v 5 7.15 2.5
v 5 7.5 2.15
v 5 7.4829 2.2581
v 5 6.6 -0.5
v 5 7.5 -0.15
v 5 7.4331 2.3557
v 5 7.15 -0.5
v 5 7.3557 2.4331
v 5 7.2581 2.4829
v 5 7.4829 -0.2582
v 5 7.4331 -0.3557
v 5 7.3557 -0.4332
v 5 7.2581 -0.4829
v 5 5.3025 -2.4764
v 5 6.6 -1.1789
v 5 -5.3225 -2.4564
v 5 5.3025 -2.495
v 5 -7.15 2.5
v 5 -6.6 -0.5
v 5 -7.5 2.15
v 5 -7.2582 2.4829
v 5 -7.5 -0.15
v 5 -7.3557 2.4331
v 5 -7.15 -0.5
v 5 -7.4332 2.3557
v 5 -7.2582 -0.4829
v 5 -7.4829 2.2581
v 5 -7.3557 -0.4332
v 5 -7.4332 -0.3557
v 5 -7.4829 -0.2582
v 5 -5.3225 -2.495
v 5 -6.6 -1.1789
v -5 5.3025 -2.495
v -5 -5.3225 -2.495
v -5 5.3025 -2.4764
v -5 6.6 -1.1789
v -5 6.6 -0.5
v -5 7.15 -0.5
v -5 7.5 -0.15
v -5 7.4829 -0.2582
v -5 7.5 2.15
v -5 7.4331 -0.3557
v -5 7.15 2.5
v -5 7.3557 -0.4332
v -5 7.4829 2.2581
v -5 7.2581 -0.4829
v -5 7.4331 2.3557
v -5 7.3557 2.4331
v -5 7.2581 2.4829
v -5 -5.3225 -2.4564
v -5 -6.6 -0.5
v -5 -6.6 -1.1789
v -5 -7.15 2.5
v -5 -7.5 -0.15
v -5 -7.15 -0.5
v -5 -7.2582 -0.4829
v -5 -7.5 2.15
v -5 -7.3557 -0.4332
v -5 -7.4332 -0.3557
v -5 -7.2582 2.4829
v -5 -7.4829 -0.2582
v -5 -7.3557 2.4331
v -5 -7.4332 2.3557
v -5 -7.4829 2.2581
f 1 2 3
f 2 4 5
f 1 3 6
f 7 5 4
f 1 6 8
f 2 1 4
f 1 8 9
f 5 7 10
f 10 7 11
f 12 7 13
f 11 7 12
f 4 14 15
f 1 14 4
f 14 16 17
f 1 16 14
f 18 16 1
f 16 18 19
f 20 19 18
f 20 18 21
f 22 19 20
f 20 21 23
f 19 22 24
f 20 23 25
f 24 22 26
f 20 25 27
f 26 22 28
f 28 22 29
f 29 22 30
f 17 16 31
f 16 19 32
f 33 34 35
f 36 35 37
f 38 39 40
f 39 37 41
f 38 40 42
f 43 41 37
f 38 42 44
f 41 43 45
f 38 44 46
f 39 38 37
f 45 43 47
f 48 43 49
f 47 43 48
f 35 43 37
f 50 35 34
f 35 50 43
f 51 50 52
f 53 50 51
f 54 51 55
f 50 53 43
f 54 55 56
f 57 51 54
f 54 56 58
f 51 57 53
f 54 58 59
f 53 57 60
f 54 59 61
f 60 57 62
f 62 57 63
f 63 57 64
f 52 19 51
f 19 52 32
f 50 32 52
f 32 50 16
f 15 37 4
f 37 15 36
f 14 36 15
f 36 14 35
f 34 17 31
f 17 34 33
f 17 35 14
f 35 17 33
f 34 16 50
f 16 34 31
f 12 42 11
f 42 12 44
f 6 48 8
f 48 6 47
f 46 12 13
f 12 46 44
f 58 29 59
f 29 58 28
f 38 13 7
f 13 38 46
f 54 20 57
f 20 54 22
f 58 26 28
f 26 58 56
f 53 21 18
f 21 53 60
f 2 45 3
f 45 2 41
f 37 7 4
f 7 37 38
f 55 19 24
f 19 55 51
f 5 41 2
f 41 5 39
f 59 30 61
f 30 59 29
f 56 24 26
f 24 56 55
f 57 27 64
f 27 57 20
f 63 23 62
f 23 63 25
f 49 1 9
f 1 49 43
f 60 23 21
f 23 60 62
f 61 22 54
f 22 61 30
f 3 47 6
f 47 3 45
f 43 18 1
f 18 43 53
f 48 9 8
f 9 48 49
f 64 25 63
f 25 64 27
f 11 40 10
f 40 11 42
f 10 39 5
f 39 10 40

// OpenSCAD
// Specs from: http://media.digikey.com/pdf/Data%20Sheets/Hirose%20PDFs/MD_Series.pdf
$fn=20;

hdmi_plug_depth=10;
hdmi_plug_width=15;
hdmi_plug_height=5;

function hdmi_depth() = hdmi_plug_depth;
function hdmi_width() = hdmi_plug_width;
function hdmi_height() = hdmi_plug_height;

hdmi_plug_top_height=3;
hdmi_plug_bottom_height=hdmi_plug_height-hdmi_plug_top_height;
hdmi_plug_bevel_width=1.3;

rounding_radius=0.35;
top_unrounded_height=hdmi_plug_top_height-(2*rounding_radius);
top_unrounded_width=hdmi_plug_width-(2*rounding_radius);
bottom_square_width=10.6;
bottom_bevel_hypotenuse=1.84;

diff_buffer=0.2;

module hdmi_upper(){
    translate([-(hdmi_plug_depth/2),-(top_unrounded_width/2),rounding_radius])
        rotate([90,0,90]) 
            linear_extrude(height=hdmi_plug_depth){
                offset(r=rounding_radius) square([top_unrounded_width,top_unrounded_height]);
            }
//    translate([0,0,2.25]) cube([10.9,15.1,4.5], center=true);
}

module hdmi_lower_side(){
    translate([0,-(hdmi_plug_bevel_width/2),(hdmi_plug_bottom_height/2) + 0.01])
    difference(){
        cube([hdmi_plug_depth, hdmi_plug_bevel_width, hdmi_plug_bottom_height], center=true);
        translate([0,-(hdmi_plug_bevel_width/2),-(hdmi_plug_bottom_height/2)]) 
            rotate([-45,0,0]) 
                cube([(hdmi_plug_depth + diff_buffer),bottom_bevel_hypotenuse,bottom_bevel_hypotenuse], center=true);
    }
}

module hdmi_lower(){
    translate([0,-(bottom_square_width/2),-(hdmi_plug_bottom_height)+0.01])
    union(){
        translate([0,0,0])
            hdmi_lower_side();
        translate([0,(bottom_square_width/2)-0.01,(hdmi_plug_bottom_height/2)])
            cube([hdmi_plug_depth,bottom_square_width+0.025,hdmi_plug_bottom_height+0.01],center=true);
        translate([0,bottom_square_width,0]) 
            rotate([0,0,180])
                hdmi_lower_side();
    }
}

module hdmi_plug(){
    translate([0,0,-((hdmi_plug_top_height/2)-(hdmi_plug_bottom_height/2))])
        union(){
            hdmi_upper();
            hdmi_lower();
        }
}

hdmi_plug();
